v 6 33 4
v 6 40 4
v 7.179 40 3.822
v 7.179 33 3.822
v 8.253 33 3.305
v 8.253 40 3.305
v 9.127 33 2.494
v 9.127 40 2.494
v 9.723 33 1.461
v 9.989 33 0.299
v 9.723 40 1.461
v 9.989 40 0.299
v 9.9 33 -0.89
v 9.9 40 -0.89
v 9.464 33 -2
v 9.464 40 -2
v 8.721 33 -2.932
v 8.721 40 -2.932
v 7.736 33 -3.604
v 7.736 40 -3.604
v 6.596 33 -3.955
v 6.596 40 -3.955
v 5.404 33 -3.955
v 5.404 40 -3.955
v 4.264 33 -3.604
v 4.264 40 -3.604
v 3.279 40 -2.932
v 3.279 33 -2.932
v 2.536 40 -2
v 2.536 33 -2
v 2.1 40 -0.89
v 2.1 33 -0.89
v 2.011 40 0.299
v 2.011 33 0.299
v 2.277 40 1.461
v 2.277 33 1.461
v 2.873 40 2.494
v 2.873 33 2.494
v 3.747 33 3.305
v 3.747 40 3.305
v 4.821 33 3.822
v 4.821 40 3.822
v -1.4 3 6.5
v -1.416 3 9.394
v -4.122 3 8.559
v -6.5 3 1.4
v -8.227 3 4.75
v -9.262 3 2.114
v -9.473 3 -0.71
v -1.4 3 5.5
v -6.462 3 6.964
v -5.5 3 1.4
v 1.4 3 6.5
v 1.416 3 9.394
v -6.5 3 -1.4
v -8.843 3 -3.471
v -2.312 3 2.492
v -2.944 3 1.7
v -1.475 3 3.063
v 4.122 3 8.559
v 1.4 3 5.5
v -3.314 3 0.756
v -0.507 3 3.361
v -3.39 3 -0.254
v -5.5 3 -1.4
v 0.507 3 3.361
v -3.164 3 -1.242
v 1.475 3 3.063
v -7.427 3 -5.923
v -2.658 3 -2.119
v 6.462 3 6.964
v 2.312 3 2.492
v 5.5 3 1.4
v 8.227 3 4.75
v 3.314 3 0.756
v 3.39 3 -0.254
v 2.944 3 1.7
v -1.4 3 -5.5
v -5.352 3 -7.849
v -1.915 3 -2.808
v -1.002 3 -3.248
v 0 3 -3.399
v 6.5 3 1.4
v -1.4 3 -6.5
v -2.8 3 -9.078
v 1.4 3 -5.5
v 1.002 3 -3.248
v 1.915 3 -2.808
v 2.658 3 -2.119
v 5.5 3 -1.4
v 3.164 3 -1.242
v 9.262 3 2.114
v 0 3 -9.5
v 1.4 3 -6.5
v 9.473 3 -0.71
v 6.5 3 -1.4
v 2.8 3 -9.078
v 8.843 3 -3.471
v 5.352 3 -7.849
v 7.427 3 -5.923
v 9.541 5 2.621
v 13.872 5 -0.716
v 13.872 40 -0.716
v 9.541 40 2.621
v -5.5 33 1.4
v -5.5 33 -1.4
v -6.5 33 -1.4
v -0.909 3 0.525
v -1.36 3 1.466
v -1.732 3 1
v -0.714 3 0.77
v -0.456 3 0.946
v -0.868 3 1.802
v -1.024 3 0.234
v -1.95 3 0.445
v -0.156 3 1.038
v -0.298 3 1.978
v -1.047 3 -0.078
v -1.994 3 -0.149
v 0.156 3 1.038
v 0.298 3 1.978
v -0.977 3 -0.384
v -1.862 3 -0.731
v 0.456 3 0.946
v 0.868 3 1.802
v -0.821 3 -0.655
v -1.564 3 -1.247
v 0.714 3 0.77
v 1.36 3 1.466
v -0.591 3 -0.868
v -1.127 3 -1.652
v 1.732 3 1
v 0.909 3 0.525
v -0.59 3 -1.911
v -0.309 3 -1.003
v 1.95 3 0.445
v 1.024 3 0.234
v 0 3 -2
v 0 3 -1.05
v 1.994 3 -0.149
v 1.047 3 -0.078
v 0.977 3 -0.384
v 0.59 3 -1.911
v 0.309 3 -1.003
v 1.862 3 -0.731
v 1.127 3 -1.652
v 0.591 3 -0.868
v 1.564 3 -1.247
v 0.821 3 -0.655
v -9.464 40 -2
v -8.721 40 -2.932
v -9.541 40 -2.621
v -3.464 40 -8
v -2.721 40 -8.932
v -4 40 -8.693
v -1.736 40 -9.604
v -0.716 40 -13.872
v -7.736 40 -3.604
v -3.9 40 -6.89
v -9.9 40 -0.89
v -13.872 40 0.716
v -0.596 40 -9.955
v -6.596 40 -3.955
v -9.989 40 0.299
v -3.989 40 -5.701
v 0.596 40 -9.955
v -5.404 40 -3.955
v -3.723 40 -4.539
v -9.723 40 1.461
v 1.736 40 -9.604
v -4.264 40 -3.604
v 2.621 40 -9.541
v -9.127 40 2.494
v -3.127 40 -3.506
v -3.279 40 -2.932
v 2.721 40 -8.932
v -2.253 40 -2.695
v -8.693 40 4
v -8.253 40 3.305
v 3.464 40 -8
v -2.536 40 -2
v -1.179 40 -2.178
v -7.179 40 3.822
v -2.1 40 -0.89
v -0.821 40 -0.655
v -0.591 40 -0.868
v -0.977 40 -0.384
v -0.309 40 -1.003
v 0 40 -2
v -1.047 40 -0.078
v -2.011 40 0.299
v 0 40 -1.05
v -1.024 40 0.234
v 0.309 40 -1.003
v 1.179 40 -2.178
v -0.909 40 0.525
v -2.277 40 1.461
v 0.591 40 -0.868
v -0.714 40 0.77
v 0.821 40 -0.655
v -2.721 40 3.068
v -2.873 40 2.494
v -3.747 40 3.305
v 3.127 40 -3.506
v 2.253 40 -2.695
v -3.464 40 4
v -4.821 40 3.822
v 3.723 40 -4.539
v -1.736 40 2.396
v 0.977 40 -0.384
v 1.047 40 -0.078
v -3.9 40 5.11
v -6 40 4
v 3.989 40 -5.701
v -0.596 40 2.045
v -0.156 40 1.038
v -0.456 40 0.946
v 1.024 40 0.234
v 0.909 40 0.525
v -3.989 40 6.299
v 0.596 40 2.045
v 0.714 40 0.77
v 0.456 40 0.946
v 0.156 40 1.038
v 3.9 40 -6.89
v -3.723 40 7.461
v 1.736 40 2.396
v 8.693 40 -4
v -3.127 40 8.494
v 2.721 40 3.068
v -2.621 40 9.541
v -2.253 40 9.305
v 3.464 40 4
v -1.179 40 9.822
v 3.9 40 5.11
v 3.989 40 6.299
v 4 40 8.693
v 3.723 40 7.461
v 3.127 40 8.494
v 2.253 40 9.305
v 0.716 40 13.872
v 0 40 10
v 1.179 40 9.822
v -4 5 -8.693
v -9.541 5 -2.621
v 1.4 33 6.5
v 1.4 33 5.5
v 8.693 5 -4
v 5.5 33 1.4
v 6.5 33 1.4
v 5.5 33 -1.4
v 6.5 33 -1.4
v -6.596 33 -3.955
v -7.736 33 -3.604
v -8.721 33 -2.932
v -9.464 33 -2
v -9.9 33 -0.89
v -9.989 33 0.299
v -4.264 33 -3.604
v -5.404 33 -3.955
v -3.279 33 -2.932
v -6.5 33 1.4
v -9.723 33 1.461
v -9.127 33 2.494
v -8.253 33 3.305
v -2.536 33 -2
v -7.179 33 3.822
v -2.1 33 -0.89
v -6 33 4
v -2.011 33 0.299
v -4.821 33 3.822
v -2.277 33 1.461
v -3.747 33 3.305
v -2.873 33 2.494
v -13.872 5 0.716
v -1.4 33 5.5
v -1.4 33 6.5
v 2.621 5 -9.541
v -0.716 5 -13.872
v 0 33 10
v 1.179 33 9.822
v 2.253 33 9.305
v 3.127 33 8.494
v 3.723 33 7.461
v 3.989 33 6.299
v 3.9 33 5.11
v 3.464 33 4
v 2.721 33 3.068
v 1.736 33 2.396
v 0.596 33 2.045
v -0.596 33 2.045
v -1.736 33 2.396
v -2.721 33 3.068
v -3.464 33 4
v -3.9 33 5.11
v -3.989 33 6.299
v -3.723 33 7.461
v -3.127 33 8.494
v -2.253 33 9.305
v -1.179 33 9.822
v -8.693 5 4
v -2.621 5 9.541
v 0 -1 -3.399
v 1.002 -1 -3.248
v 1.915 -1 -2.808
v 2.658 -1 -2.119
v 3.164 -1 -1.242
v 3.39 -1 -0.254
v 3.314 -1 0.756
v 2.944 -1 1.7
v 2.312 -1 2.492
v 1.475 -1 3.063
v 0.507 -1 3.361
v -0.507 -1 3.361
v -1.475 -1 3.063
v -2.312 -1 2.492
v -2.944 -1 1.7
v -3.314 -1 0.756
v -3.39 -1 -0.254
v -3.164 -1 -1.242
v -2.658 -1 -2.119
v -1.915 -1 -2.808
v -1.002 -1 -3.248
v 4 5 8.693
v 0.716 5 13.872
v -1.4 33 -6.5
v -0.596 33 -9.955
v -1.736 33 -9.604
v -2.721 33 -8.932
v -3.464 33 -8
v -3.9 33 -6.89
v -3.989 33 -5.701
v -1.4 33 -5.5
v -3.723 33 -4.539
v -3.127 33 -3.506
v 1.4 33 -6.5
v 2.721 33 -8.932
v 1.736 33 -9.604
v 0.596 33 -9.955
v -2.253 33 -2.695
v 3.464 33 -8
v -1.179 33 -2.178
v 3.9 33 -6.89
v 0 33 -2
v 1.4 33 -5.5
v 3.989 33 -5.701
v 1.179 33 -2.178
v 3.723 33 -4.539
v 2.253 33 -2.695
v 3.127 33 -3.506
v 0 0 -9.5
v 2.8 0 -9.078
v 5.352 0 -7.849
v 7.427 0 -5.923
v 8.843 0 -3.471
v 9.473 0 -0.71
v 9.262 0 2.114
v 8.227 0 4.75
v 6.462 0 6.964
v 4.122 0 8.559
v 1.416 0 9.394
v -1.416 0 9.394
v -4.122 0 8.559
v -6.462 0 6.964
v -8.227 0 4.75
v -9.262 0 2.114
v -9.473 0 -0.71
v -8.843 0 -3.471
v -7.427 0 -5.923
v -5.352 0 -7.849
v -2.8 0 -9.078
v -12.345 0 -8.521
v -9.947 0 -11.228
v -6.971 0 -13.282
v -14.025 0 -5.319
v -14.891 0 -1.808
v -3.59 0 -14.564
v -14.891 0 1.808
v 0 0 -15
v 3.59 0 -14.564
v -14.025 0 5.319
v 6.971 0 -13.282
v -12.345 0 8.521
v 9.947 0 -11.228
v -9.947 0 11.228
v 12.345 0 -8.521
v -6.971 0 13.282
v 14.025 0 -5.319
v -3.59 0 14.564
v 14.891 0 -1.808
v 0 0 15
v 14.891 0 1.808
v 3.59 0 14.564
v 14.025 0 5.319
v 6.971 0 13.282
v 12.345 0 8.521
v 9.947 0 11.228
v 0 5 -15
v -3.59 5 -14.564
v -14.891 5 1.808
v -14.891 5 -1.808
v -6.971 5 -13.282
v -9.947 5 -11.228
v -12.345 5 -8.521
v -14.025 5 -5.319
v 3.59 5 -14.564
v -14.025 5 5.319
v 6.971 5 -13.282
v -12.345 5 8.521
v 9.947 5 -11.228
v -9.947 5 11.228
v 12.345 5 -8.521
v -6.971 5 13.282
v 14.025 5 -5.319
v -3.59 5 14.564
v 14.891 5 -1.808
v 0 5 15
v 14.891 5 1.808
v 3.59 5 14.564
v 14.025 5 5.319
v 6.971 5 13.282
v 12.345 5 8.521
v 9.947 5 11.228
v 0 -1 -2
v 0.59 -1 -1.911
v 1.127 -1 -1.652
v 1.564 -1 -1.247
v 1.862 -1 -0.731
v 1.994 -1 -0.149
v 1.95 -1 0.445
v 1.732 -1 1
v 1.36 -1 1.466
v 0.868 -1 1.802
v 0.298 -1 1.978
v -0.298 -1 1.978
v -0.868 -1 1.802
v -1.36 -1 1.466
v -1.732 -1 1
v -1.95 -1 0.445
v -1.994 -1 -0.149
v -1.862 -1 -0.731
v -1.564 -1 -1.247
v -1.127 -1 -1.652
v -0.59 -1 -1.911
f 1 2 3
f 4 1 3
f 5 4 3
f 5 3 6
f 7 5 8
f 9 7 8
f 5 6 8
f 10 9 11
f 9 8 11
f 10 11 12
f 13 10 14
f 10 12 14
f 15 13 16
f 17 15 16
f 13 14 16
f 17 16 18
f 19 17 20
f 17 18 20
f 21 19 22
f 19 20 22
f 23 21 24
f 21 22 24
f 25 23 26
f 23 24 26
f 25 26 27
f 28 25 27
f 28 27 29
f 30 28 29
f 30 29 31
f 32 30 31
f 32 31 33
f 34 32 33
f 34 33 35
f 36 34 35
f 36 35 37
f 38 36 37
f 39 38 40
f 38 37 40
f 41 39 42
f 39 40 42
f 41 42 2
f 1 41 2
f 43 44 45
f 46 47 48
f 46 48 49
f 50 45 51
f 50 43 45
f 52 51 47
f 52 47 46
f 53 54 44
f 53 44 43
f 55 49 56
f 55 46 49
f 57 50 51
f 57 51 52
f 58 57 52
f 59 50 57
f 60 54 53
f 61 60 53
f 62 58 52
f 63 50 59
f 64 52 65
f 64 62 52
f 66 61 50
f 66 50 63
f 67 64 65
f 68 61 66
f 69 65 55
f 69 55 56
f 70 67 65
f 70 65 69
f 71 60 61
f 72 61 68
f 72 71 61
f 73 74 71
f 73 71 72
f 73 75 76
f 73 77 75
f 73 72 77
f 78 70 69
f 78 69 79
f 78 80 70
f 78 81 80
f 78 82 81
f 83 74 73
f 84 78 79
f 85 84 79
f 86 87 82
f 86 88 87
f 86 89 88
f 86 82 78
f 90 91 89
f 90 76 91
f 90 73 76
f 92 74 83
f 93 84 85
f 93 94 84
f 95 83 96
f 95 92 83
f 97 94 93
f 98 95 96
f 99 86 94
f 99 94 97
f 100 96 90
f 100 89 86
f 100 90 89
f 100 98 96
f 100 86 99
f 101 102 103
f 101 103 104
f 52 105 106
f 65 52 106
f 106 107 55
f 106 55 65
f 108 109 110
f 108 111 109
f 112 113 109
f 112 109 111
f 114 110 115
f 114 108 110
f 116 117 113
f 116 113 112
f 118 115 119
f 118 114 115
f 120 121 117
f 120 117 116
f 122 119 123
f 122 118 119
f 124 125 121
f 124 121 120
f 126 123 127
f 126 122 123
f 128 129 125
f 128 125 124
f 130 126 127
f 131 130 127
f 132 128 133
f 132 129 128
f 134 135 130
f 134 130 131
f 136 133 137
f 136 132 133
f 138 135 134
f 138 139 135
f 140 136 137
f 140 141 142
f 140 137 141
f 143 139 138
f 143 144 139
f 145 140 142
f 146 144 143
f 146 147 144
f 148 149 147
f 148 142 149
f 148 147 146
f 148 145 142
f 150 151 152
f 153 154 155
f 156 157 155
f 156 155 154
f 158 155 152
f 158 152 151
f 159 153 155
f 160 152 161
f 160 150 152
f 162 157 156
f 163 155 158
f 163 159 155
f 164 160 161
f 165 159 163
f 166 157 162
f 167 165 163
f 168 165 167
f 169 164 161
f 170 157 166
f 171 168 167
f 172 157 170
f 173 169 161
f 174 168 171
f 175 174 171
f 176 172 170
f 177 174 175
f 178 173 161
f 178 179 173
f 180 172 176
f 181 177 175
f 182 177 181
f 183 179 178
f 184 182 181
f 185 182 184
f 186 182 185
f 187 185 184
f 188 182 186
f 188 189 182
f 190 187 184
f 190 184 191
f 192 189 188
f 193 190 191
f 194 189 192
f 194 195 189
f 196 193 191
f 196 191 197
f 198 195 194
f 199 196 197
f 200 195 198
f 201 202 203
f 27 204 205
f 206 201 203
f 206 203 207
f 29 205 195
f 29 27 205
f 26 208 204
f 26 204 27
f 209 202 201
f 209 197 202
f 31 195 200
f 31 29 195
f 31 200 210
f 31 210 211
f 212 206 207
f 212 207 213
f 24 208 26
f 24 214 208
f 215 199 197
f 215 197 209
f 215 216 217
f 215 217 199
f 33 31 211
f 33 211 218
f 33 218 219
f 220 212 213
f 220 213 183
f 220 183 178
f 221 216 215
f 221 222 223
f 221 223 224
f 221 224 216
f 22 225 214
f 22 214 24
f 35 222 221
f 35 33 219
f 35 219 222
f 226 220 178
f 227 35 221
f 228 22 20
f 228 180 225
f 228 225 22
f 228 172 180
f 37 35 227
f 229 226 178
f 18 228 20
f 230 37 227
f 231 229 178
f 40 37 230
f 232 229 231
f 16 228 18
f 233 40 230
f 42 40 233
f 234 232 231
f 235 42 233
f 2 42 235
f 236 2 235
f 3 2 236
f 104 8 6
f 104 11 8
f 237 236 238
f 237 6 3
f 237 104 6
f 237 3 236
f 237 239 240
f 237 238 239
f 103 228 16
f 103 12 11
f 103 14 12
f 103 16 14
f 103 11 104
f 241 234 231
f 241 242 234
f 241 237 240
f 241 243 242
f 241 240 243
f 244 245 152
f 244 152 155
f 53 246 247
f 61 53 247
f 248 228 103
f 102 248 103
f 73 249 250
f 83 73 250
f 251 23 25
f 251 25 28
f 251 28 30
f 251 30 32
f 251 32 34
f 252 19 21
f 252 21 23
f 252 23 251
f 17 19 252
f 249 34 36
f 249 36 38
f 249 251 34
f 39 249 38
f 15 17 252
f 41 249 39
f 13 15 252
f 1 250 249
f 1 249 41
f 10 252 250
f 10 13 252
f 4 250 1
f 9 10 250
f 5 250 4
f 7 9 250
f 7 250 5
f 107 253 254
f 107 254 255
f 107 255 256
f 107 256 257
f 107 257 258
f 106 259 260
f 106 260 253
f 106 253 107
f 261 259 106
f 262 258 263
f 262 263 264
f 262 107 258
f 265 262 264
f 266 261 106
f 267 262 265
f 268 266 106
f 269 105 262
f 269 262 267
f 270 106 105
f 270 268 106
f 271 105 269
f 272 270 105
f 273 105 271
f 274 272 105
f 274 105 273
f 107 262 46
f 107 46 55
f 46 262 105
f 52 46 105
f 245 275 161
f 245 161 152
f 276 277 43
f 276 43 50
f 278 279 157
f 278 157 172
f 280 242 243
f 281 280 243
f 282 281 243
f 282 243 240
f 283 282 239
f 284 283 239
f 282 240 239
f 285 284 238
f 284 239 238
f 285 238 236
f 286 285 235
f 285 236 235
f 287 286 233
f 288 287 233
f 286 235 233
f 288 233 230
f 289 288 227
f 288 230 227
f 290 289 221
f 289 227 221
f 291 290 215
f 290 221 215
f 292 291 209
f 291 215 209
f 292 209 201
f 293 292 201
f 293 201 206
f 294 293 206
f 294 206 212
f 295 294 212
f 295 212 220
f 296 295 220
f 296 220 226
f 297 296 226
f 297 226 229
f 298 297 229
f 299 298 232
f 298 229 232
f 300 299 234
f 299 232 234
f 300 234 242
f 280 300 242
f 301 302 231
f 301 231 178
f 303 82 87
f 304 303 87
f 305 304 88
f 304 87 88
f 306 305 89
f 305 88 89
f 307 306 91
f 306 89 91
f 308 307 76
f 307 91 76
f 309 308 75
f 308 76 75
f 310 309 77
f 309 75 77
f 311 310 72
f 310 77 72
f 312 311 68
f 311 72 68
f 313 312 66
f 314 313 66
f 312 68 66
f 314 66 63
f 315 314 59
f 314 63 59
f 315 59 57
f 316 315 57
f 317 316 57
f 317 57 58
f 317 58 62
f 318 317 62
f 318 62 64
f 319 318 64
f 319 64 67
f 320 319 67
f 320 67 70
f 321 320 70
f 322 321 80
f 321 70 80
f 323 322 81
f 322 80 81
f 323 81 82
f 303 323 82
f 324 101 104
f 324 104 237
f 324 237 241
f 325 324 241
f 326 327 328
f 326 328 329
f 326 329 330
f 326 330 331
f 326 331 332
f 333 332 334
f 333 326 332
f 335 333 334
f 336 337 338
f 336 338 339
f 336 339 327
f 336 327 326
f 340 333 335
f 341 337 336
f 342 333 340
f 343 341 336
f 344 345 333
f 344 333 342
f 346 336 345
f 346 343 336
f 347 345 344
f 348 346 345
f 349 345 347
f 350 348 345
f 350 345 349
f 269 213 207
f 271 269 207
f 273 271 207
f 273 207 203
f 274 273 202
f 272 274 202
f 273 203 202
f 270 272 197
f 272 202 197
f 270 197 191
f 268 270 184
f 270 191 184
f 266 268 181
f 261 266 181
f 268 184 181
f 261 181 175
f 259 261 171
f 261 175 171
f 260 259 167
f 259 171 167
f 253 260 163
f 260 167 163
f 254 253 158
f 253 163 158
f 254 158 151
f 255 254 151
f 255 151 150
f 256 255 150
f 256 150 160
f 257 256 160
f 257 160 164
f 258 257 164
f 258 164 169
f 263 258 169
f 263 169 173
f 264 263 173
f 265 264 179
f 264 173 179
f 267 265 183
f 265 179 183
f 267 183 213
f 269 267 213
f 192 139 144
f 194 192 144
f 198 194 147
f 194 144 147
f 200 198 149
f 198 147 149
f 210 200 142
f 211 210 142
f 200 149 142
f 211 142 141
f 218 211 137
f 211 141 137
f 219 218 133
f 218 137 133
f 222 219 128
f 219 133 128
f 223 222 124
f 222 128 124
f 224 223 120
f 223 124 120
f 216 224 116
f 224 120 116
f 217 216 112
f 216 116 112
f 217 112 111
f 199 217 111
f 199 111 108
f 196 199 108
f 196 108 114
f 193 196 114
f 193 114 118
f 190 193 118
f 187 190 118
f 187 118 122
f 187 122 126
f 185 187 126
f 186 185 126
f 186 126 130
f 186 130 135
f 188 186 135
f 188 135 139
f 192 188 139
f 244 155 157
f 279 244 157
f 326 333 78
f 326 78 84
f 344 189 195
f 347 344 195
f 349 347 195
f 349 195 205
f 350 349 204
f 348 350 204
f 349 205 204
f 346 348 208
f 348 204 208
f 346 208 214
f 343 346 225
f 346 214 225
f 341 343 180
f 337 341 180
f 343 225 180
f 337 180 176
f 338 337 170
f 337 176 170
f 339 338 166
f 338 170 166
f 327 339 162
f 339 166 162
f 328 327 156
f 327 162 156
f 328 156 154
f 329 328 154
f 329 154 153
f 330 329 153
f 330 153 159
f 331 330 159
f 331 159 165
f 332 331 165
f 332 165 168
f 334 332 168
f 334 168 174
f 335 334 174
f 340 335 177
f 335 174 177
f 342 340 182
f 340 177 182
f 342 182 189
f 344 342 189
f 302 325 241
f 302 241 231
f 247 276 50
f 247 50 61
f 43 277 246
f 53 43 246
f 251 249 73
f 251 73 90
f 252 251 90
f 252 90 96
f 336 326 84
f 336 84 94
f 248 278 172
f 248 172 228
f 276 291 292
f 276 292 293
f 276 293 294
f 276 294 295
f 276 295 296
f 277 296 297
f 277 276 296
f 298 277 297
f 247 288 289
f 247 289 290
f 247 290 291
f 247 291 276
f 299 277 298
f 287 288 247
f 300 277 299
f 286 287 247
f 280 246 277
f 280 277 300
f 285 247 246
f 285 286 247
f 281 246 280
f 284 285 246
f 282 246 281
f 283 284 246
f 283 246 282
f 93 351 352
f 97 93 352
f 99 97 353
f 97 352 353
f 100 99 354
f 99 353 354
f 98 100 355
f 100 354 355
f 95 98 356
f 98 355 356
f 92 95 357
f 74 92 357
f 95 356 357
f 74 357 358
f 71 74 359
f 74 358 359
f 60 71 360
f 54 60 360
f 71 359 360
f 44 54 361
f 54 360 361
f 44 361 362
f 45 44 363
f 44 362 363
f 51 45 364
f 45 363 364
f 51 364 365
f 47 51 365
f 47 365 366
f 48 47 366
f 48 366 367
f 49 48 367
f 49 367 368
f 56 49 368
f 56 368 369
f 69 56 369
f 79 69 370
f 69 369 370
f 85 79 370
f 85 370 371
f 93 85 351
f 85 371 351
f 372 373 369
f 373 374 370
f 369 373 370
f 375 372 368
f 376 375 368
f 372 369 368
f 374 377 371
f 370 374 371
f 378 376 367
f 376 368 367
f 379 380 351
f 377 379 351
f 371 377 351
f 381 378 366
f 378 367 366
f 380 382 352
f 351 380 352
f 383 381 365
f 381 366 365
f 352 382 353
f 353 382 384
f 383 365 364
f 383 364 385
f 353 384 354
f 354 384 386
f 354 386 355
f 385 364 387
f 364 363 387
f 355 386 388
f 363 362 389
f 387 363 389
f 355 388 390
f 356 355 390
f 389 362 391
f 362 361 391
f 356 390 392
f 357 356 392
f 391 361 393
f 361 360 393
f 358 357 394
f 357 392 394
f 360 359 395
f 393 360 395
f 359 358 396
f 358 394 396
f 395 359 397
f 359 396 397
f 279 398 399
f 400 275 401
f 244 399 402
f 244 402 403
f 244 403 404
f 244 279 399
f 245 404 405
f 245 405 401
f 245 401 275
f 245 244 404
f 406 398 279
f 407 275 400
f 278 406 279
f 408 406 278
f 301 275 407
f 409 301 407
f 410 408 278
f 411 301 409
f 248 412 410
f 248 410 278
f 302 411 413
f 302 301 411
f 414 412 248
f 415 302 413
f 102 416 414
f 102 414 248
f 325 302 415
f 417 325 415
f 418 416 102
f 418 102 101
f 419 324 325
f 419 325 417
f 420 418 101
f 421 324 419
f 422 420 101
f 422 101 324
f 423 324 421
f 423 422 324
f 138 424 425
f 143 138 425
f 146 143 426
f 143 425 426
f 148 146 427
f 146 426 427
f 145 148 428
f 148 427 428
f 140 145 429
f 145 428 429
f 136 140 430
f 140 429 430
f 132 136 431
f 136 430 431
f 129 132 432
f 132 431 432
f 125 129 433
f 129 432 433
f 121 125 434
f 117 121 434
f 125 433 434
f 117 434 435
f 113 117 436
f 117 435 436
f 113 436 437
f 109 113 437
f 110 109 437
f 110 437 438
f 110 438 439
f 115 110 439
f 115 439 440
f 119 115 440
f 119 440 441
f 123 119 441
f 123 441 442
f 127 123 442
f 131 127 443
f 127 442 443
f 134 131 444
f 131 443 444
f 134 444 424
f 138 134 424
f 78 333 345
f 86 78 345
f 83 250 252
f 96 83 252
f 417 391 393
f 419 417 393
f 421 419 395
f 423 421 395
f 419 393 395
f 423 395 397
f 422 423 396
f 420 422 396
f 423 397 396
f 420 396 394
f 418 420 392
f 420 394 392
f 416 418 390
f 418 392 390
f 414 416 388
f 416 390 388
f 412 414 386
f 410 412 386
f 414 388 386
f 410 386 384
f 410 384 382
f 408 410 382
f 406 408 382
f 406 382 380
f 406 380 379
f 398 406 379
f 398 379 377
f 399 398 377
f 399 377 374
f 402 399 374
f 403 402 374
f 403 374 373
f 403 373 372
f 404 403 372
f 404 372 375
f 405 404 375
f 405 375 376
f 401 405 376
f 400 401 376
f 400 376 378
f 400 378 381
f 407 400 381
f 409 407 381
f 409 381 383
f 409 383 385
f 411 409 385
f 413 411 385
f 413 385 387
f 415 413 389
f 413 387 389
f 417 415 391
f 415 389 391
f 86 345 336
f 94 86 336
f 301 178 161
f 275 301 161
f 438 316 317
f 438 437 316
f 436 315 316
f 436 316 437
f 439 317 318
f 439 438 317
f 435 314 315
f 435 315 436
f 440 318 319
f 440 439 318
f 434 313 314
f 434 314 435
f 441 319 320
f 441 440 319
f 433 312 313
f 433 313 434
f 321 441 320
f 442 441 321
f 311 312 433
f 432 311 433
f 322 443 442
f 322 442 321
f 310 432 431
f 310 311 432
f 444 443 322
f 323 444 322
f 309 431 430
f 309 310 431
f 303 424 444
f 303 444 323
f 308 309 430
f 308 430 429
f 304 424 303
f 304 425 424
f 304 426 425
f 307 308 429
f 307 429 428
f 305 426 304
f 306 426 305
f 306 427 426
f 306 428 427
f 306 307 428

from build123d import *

# Parameters (mm, degrees)
SKETCH1_R           = 15
BOSS_EXTRUDE1_DEPTH = 40
SKETCH2_R           = 4
CUT_EXTRUDE1_DEPTH  = 7
SKETCH6_W           = 2.8
SKETCH6_H           = 1
SKETCH6_W_2         = 1
SKETCH6_H_2         = 2.8
CUT_EXTRUDE4_DEPTH  = 30
SKETCH7_R           = 9.5
CUT_EXTRUDE5_DEPTH  = 3
CUT_EXTRUDE6_REACH  = 44.65
SKETCH8_R           = 1.05
SKETCH9_R           = 3.39912378
BOSS_EXTRUDE2_DEPTH = 4
SKETCH10_R          = 2
CUT_EXTRUDE7_DEPTH  = 4
CUT_EXTRUDE9_START  = -35
SKETCH13_R          = 15
CUT_EXTRUDE9_DEPTH  = 35


with BuildPart() as part:
    # Sketch1 → Boss-Extrude1 (new body)
    with BuildSketch(Plane(origin=(0, 0, 0), x_dir=(1, 0, 0), z_dir=(0, 1, 0))):
        with Locations(Location((0, 0, 0), (0, 0, 270))):
            Circle(SKETCH1_R)
    extrude(amount=BOSS_EXTRUDE1_DEPTH)

    # Sketch2 → Cut-Extrude1 (cut)
    with BuildSketch(Plane(origin=(0, 40, 0), x_dir=(1, 0, 0), z_dir=(0, 1, 0))):
        with Locations(Location((0, 6, 0), (0, 0, 270))):
            Circle(SKETCH2_R)
        with Locations(Location((6, 0, 0), (0, 0, 270))):
            Circle(SKETCH2_R)
        with Locations(Location((0, -6, 0), (0, 0, 270))):
            Circle(SKETCH2_R)
        with Locations(Location((-6, 0, 0), (0, 0, 270))):
            Circle(SKETCH2_R)
    extrude(amount=-CUT_EXTRUDE1_DEPTH, mode=Mode.SUBTRACT)

    # Sketch6 → Cut-Extrude4 (cut)
    with BuildSketch(Plane(origin=(0, 33, 0), x_dir=(1, 0, 0), z_dir=(0, 1, 0))):
        with Locations((0, -6)):
            Rectangle(SKETCH6_W, SKETCH6_H)
        with Locations((6, 0)):
            Rectangle(SKETCH6_W_2, SKETCH6_H_2)
        with Locations((-6, 0)):
            Rectangle(SKETCH6_W_2, SKETCH6_H_2)
        with Locations((0, 6)):
            Rectangle(SKETCH6_W, SKETCH6_H)
    extrude(amount=-CUT_EXTRUDE4_DEPTH, mode=Mode.SUBTRACT)

    # Sketch7 → Cut-Extrude5 (cut)
    with BuildSketch(Plane.XZ):
        with Locations(Location((0, 0, 0), (0, 0, 270))):
            Circle(SKETCH7_R)
    extrude(amount=-CUT_EXTRUDE5_DEPTH, mode=Mode.SUBTRACT)

    # Sketch8 → Cut-Extrude6 (cut, up to next)
    with BuildSketch(Plane.XZ.offset(-3), mode=Mode.PRIVATE) as cut_extrude6_sk1:
        with Locations(Location((0, 0, 0), (0, 0, 270))):
            Circle(SKETCH8_R)
    cut_extrude6_tool1 = extrude(cut_extrude6_sk1.sketch, amount=-CUT_EXTRUDE6_REACH, mode=Mode.PRIVATE) & part.part
    add(cut_extrude6_tool1.solids().sort_by_distance((0, 3, 0))[0], mode=Mode.SUBTRACT)

    # Sketch9 → Boss-Extrude2 (add)
    with BuildSketch(Plane.XZ.offset(-3)):
        with Locations(Location((0, 0, 0), (0, 0, 270))):
            Circle(SKETCH9_R)
    extrude(amount=BOSS_EXTRUDE2_DEPTH)

    # Sketch10 → Cut-Extrude7 (cut)
    with BuildSketch(Plane.XZ.offset(1)):
        with Locations(Location((0, 0, 0), (0, 0, 270))):
            Circle(SKETCH10_R)
    extrude(amount=-CUT_EXTRUDE7_DEPTH, mode=Mode.SUBTRACT)

    # Sketch13 → Cut-Extrude9 (cut)
    with BuildSketch(Plane(origin=(0, 40, 0), x_dir=(1, 0, 0), z_dir=(0, 1, 0)).offset(CUT_EXTRUDE9_START)):
        with Locations(Location((0, 0, 0), (0, 0, 270))):
            Circle(SKETCH13_R)
        Polygon((8.693004096, 4), (13.871626361, 0.715633025), (9.540851678, -2.621495041), (4, -8.693004096), (0.715633025, -13.871626361), (-2.621495041, -9.540851678), (-8.693004096, -4), (-13.871626361, -0.715633025), (-9.540851678, 2.621495041), (-4, 8.693004096), (-0.715633025, 13.871626361), (2.621495041, 9.540851678), align=None, mode=Mode.SUBTRACT)
    extrude(amount=CUT_EXTRUDE9_DEPTH, mode=Mode.SUBTRACT)


solid = part.part
